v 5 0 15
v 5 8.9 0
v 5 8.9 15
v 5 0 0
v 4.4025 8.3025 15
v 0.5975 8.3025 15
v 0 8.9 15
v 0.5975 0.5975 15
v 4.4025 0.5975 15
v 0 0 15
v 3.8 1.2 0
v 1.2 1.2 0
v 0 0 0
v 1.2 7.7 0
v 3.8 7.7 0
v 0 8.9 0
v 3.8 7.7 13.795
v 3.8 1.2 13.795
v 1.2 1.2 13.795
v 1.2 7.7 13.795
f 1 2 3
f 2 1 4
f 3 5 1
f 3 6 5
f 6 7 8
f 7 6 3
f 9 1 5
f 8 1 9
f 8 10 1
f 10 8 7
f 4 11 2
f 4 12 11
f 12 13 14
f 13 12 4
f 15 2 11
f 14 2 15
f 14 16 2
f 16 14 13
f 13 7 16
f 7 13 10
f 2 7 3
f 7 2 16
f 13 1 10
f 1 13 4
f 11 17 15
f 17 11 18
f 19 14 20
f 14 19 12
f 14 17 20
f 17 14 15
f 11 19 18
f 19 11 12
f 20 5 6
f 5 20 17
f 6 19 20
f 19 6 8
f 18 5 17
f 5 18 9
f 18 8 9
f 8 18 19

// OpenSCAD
//CUSTOMIZER VARIABLES

//Inner size X in mm
inner_x=2.6;
//Inner size Y in mm
inner_y=6.5;
//Height Z in mm
height=15;

//CUSTOMIZER VARIABLES END

module BeltLock(x_in, y_in, h,  $fn=50) {
    wall = 1.2;
    difference(){
        cube([x_in+wall*2,y_in+wall*2,h]);
        translate([wall, wall,0])cube([x_in,y_in,h]);
        translate([(x_in+wall*2)/2,(y_in+wall*2)/2,h-wall])
            hull(){cube([x_in,y_in,0.01], center=true);
                translate([0,0,wall*2])cube([x_in+wall*2,y_in+wall*2,0.01],center=true);}
    
        }
}

BeltLock(inner_x, inner_y, height);
   
/* source   
translate([10,0,0])
difference(){
    cube([2.8+2.4,6.5+2.4,15]);
    translate([1.2,1.2,0])cube([2.8,6.5,15]);
    #translate([2.6,8.9/2,15-1.2])
  hull(){cube([2.8,6.5,0.01],center=true);
   translate([0,0,2.4])cube([2.8+2.4,6.5+2.4,0.01],center=true);}
}
*/
